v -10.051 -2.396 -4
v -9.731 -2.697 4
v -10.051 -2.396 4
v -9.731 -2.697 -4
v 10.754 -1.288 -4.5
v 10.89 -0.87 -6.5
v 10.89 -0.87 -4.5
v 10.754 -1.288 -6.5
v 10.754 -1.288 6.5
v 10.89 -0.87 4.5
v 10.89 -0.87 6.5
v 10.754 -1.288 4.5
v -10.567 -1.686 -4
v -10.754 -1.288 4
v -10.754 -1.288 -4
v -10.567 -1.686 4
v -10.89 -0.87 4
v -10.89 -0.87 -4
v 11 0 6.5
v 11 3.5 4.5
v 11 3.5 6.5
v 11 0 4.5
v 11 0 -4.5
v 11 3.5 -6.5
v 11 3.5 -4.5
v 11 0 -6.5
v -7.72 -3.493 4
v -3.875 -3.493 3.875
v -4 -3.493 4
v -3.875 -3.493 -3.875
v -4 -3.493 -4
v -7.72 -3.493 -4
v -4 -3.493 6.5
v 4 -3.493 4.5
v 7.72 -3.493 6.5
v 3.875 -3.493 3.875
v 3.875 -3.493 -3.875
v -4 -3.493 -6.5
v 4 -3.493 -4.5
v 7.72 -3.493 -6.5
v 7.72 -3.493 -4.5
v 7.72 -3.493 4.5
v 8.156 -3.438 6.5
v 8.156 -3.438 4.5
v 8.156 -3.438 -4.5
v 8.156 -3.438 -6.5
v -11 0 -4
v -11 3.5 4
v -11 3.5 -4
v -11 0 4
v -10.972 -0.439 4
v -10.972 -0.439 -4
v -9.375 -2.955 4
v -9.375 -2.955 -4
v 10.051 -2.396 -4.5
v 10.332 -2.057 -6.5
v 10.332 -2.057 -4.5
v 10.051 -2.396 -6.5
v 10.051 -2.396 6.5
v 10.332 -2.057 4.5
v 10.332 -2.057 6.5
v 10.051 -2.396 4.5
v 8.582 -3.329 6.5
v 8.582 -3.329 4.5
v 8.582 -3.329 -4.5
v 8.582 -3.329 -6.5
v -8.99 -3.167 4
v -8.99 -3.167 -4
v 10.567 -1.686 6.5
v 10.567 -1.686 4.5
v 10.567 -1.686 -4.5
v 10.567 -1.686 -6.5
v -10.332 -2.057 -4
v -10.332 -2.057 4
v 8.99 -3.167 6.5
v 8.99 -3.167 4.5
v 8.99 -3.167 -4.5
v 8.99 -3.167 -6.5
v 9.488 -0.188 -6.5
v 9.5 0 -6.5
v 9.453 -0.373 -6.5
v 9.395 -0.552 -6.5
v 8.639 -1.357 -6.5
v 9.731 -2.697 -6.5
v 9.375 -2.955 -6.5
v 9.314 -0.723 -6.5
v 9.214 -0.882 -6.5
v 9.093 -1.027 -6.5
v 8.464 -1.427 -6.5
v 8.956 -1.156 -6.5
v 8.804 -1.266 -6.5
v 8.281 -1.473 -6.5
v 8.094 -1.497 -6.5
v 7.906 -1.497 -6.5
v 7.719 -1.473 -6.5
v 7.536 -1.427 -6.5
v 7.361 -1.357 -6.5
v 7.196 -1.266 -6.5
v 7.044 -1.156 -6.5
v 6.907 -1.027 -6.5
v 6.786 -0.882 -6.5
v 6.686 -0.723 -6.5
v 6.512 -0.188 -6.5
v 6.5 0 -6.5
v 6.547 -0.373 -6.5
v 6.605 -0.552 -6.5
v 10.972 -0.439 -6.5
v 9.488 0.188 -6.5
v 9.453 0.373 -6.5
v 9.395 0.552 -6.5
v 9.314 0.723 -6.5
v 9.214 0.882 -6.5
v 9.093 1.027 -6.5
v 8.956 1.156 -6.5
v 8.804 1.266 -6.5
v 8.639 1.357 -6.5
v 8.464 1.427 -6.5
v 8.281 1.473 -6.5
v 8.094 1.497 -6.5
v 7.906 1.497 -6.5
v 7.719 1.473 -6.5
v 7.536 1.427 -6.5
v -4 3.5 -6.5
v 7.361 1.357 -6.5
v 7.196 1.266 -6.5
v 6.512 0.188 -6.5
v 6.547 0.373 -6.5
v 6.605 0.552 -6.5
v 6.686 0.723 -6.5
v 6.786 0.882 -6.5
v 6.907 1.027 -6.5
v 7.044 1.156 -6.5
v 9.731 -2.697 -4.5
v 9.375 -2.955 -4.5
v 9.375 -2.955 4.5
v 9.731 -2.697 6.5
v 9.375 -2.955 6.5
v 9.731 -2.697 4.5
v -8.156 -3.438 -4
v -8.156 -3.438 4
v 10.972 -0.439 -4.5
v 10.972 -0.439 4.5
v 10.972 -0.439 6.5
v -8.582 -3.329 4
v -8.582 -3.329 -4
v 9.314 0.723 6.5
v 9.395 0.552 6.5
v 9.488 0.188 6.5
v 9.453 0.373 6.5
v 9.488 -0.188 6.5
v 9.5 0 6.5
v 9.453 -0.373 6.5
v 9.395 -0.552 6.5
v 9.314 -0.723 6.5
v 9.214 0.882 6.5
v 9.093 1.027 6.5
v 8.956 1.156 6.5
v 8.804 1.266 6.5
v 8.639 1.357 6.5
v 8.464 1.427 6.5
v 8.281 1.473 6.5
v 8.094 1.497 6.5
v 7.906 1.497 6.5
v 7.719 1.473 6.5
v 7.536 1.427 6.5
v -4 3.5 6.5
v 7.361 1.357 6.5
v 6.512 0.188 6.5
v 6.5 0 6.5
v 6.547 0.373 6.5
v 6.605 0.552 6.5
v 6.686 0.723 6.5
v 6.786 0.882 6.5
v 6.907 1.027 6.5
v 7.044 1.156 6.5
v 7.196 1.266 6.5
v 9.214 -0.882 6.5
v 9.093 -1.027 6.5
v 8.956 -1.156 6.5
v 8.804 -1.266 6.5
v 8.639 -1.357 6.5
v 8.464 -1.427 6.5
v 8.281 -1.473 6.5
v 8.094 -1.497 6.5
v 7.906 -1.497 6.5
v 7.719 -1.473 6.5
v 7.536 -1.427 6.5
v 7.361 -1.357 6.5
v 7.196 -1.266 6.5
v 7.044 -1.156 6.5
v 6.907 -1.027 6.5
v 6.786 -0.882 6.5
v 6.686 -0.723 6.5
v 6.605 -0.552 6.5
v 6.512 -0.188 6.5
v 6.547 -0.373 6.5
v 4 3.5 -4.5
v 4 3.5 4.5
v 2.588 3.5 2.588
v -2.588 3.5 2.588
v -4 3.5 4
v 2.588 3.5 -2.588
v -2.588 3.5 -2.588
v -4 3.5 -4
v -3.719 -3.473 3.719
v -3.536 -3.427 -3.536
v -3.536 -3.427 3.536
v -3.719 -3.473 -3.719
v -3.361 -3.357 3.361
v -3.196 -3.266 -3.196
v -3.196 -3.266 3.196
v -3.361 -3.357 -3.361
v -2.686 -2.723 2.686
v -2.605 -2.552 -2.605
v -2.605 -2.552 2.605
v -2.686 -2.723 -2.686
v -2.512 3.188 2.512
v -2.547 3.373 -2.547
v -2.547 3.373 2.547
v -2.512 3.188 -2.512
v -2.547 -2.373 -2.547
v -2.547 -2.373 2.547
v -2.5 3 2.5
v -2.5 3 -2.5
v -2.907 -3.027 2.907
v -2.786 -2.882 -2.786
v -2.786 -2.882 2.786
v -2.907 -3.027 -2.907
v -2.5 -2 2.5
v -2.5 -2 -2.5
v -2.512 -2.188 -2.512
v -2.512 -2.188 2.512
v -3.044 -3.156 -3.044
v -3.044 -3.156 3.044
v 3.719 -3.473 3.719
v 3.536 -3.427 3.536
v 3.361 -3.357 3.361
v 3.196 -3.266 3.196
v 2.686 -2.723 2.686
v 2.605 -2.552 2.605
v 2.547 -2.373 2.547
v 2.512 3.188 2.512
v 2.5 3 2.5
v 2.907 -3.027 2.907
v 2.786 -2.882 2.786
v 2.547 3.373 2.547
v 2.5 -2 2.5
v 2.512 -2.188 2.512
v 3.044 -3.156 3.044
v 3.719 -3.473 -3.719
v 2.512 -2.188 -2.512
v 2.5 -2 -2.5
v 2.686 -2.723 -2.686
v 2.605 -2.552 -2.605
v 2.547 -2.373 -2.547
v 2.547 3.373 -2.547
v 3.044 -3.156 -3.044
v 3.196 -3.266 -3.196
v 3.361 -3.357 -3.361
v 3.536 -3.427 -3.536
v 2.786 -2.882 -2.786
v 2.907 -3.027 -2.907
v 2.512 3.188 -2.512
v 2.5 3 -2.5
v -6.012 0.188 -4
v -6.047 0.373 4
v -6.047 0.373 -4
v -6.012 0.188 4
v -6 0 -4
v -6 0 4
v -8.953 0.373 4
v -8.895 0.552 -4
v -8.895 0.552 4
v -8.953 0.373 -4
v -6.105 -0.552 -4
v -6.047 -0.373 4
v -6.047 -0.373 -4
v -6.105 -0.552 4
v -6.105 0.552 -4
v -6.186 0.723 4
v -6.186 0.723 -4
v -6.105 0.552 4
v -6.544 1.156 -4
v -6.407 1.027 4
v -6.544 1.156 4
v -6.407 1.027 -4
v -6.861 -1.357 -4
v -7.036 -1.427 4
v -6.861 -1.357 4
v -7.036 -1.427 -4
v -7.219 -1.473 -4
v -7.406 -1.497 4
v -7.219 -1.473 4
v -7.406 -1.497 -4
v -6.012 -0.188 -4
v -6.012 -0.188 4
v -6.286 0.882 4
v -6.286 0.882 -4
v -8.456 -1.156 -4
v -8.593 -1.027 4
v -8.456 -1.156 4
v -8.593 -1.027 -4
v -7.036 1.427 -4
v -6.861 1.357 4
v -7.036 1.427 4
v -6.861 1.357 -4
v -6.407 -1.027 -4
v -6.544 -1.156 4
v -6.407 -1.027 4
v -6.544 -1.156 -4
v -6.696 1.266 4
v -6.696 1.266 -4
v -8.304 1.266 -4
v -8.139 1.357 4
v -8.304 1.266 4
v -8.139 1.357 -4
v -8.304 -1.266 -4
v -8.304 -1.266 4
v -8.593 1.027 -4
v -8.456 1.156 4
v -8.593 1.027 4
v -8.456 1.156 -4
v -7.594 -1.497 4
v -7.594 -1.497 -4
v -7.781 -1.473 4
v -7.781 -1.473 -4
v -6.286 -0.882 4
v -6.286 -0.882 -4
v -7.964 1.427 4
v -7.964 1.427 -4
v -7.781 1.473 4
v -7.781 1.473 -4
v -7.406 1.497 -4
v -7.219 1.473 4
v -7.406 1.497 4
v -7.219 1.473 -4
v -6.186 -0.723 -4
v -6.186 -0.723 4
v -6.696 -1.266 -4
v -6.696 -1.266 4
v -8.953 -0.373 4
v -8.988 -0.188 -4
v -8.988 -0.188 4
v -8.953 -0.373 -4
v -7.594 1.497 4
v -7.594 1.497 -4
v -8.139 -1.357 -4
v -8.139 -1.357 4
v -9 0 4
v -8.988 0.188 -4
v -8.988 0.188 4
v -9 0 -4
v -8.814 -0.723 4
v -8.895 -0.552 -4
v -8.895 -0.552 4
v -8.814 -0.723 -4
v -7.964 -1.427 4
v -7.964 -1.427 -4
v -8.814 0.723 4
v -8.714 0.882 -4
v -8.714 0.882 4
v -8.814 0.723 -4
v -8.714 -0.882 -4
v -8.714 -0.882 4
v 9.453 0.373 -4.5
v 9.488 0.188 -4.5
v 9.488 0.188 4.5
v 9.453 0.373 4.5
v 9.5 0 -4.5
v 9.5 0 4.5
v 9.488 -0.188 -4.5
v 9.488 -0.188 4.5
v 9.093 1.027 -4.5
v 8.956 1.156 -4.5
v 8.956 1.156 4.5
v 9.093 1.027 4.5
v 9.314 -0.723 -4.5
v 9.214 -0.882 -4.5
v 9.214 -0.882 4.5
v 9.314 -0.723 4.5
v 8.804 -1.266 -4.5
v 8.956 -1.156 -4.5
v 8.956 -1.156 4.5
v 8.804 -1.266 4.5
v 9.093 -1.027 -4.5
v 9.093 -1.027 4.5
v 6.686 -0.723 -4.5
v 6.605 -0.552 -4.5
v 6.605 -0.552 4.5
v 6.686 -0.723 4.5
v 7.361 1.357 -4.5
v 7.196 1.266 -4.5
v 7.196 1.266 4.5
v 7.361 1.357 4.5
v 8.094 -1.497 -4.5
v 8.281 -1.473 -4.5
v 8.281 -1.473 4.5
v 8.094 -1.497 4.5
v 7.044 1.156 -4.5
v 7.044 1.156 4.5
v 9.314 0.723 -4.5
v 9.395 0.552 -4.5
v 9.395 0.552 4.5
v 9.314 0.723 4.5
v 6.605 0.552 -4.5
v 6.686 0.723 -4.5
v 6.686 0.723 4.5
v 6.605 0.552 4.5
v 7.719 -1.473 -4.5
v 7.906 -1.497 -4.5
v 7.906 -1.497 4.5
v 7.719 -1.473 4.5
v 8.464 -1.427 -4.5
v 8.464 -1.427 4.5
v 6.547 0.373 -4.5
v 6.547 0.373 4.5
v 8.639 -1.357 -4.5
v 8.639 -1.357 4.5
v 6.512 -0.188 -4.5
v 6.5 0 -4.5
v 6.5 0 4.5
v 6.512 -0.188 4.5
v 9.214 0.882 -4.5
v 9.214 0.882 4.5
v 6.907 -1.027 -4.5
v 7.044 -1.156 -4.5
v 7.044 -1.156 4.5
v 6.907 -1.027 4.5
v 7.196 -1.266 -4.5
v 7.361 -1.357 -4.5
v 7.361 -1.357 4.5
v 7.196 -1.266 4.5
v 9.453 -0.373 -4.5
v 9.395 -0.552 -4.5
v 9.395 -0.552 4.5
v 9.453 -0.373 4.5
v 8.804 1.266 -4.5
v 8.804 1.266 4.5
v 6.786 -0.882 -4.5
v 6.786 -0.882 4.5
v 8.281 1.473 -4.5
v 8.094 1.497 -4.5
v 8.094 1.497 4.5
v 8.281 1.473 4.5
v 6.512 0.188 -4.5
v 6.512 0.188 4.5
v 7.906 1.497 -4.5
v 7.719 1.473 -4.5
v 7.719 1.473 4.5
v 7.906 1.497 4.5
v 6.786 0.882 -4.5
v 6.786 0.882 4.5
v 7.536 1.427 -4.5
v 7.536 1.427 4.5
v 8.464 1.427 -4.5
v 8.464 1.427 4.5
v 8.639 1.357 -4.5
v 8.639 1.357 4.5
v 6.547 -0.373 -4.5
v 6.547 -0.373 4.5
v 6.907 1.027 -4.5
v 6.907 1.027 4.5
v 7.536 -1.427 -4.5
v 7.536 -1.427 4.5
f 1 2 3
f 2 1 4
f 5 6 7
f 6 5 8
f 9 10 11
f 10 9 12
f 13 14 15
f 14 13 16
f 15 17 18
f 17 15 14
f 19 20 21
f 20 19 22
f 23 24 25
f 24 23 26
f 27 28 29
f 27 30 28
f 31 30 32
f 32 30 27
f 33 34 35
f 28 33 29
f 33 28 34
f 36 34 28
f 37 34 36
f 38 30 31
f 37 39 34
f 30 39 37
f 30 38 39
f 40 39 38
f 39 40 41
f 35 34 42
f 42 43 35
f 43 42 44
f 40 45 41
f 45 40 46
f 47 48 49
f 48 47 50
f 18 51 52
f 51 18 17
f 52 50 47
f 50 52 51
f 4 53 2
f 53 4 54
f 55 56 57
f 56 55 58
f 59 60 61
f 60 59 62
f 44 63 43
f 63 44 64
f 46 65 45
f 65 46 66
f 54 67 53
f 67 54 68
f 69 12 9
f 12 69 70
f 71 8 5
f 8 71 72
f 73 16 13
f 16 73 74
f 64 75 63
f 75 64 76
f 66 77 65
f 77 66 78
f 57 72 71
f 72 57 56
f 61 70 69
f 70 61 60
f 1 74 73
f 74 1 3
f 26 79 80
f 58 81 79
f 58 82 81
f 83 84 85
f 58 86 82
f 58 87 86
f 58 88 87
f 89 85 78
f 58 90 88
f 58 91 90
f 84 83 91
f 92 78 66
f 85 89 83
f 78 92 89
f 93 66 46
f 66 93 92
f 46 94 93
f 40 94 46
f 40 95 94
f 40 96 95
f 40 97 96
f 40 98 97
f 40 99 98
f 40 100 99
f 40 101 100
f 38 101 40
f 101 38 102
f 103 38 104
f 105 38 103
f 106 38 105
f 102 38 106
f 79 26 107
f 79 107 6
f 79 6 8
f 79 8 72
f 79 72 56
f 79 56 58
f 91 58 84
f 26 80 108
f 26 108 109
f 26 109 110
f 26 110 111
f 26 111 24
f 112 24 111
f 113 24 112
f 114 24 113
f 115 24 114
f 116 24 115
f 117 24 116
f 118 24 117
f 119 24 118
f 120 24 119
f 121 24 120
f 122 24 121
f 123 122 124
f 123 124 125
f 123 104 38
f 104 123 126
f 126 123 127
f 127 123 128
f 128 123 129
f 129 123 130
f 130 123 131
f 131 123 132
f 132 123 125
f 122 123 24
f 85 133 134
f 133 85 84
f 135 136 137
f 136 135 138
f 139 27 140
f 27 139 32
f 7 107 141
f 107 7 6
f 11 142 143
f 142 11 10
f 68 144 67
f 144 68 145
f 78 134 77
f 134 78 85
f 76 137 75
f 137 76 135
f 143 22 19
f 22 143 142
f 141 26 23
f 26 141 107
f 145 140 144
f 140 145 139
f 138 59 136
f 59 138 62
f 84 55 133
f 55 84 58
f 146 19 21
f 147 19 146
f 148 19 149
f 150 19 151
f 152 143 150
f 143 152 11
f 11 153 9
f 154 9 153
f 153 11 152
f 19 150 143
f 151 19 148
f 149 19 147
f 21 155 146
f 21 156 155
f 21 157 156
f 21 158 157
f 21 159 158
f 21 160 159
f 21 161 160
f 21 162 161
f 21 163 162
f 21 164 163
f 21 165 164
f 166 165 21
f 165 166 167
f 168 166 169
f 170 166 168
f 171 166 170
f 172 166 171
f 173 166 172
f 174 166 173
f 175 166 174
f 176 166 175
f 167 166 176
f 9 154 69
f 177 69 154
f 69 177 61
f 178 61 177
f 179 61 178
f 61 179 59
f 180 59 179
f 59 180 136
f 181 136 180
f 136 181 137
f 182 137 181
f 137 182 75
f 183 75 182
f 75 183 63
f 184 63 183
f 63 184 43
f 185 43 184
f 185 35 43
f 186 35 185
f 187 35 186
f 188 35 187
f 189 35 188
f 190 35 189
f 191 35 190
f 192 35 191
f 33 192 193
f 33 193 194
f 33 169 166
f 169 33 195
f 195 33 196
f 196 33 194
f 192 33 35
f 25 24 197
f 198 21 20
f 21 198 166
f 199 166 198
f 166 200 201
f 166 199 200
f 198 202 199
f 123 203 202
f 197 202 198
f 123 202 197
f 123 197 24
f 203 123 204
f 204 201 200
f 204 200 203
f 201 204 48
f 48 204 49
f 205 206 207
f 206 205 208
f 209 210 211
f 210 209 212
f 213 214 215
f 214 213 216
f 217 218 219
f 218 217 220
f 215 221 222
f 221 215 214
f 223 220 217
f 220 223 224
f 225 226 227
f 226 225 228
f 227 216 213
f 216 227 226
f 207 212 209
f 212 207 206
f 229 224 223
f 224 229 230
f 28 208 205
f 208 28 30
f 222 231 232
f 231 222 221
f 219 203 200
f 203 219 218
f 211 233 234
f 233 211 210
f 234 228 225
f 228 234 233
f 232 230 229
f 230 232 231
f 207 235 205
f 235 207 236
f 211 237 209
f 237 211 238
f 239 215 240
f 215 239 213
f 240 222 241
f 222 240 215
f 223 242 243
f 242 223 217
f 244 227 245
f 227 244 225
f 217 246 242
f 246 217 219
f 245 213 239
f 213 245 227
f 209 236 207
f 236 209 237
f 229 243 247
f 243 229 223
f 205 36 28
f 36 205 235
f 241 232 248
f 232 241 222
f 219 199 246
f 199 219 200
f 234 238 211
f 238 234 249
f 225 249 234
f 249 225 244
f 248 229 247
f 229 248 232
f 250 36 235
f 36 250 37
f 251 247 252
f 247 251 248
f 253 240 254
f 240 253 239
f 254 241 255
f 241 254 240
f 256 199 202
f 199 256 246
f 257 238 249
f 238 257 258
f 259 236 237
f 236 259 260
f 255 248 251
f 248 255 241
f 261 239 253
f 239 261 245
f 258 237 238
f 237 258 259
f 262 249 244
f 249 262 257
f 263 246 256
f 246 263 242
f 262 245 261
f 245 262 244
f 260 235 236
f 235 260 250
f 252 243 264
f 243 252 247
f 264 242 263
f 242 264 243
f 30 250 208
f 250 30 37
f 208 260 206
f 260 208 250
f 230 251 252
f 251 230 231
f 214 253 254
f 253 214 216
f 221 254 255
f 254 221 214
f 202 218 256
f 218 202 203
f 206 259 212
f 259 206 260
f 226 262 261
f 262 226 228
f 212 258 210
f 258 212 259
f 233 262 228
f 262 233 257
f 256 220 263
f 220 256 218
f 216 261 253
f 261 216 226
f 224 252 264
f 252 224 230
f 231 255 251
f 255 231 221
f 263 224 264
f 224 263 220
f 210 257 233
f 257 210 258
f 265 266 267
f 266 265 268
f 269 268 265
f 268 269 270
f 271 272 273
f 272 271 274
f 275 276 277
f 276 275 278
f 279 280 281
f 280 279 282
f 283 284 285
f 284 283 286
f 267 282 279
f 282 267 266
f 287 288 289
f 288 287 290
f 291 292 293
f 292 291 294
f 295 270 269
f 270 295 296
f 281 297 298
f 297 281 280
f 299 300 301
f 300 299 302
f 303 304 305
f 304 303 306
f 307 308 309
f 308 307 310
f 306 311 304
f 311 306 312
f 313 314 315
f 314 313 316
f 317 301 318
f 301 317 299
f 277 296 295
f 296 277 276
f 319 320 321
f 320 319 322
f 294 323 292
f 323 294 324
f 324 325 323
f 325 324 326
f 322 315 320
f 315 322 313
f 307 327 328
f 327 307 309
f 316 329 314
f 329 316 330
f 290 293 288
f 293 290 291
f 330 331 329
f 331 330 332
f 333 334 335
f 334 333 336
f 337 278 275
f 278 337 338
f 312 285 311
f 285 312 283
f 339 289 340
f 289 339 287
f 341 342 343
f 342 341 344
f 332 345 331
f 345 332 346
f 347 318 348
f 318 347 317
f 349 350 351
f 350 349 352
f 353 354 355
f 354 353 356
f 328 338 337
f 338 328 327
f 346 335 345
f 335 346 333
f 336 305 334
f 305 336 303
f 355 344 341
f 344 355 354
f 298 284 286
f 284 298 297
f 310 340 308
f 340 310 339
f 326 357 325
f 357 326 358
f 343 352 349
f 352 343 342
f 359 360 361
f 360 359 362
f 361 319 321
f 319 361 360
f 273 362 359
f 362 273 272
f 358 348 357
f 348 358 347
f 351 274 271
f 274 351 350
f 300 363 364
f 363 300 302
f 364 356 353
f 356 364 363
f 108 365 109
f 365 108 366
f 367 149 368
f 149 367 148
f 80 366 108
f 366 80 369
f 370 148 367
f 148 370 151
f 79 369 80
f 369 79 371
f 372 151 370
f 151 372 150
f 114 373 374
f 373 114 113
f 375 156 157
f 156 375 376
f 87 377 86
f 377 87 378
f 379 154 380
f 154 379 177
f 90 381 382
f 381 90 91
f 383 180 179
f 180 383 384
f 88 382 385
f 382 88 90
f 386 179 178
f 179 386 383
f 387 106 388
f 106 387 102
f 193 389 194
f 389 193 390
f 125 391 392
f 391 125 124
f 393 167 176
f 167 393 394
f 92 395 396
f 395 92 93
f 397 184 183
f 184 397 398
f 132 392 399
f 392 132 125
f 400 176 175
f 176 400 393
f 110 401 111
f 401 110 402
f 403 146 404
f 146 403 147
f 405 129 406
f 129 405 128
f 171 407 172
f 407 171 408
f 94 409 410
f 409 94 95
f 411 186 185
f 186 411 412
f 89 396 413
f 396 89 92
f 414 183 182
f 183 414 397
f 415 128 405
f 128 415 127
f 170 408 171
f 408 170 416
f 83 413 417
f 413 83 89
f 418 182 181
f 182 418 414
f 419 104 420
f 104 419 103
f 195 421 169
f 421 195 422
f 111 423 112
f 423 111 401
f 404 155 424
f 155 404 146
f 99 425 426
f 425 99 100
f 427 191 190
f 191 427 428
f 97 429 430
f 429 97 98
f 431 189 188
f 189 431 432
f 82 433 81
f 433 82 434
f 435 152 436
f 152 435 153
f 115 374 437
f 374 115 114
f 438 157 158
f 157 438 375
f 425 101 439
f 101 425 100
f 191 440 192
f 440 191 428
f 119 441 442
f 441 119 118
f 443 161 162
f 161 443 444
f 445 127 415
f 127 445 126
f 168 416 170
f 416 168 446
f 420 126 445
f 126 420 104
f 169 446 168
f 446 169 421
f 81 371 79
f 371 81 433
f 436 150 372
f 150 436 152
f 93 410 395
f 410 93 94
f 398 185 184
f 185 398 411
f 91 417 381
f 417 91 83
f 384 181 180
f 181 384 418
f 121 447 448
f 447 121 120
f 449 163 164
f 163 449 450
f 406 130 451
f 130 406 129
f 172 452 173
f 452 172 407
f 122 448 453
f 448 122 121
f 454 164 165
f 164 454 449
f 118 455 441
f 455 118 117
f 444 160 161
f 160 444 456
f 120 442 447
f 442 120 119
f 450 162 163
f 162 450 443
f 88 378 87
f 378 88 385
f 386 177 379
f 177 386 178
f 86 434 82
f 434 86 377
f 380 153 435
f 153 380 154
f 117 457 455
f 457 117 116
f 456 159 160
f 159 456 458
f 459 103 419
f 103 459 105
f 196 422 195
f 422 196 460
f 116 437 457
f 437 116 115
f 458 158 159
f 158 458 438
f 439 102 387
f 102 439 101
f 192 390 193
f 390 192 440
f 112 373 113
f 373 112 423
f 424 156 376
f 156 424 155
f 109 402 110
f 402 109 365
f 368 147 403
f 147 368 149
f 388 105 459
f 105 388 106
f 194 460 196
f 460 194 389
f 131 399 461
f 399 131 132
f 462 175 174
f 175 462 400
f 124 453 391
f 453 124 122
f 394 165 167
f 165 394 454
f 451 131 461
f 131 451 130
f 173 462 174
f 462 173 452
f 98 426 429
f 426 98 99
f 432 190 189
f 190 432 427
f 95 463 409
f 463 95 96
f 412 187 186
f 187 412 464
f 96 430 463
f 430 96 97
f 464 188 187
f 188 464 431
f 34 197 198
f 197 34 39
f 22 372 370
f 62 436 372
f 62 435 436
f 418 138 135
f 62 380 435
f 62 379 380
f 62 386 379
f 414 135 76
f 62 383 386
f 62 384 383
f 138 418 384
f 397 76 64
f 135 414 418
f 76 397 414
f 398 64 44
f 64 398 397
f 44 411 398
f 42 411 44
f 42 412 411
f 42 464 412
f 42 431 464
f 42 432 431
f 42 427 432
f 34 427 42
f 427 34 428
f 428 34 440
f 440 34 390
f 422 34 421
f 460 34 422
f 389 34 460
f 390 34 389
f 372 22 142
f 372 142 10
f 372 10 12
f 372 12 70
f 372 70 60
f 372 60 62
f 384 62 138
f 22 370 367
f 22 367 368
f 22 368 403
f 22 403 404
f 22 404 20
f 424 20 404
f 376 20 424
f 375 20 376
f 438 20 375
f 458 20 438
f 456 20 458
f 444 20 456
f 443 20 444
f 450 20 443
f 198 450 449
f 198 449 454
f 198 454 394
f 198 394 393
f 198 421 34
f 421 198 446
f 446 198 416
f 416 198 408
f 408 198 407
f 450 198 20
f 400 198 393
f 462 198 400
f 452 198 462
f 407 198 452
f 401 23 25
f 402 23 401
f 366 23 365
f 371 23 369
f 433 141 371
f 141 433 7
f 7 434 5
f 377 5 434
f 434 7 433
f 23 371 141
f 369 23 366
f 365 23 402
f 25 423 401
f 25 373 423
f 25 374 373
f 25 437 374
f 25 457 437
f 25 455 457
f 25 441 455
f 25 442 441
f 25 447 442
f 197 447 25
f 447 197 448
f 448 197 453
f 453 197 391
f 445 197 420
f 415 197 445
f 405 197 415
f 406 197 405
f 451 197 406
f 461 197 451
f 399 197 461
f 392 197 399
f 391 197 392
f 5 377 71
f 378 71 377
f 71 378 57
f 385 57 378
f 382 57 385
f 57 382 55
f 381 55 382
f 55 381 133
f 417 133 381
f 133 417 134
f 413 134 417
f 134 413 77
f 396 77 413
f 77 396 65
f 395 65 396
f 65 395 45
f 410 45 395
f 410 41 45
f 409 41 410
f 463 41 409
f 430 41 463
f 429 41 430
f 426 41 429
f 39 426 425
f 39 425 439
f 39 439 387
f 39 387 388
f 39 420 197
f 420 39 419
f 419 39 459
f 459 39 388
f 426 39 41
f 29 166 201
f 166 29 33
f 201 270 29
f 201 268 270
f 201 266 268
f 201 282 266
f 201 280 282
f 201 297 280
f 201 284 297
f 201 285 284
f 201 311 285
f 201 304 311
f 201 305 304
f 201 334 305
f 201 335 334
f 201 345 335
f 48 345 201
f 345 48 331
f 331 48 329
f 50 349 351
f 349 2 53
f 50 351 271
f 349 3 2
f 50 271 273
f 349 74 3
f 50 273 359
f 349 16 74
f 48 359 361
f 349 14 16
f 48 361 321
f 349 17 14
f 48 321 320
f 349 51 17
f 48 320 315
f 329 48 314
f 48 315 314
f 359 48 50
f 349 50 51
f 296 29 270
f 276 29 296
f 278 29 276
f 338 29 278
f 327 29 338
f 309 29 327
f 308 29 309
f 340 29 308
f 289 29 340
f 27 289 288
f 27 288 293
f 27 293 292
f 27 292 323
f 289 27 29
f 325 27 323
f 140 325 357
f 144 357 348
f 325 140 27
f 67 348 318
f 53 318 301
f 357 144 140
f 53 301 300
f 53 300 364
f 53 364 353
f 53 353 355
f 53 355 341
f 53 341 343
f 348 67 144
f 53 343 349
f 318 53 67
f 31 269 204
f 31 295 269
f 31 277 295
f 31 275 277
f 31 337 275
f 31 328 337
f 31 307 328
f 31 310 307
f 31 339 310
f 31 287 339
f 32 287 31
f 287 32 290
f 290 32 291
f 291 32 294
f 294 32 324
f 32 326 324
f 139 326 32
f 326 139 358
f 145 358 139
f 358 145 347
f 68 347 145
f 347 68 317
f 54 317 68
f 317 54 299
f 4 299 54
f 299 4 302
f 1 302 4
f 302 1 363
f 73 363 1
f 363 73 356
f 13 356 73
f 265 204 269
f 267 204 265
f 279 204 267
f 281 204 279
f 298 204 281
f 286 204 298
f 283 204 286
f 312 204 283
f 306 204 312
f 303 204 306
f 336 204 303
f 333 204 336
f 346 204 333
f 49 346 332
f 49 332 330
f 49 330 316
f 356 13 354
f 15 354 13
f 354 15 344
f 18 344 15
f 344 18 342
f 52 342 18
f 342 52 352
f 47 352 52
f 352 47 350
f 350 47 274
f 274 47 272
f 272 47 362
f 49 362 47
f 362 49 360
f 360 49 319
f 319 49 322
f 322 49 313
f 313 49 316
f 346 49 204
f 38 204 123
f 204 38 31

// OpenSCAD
HOLE_DIA = 3;
HOLE_SIZE = 5;
THICKNESS = 1.5;

CHAIN_DELTA = 1;
CHAIN_SPACING = 8;

FRONT_WIDTH = 8;
FRONT_DIA = HOLE_DIA + 2 * THICKNESS;
BACK_WIDTH = 2;
BACK_DIA = FRONT_DIA + CHAIN_DELTA;

$fn = 50;

module chain_link_base() {
  union() {
    hull() {
      translate([-(FRONT_DIA + CHAIN_SPACING)/2, 0, 0])
      cylinder(d = FRONT_DIA, h = FRONT_WIDTH, center = true);

      translate([(BACK_DIA + CHAIN_SPACING)/2, 0, 0])
      cylinder(d = FRONT_DIA, h = FRONT_WIDTH, center = true);
    }
    hull() {
      translate([(BACK_DIA + CHAIN_SPACING)/2, 0, 0])
      cylinder(d = BACK_DIA, h = FRONT_WIDTH + 2 * BACK_WIDTH + CHAIN_DELTA, center = true);

      translate([-(BACK_DIA + CHAIN_SPACING)/2, 0, 0])
      cylinder(d = BACK_DIA, h = FRONT_WIDTH + 2 * BACK_WIDTH + CHAIN_DELTA, center = true);
    }
  }
}

module holes() {
  #union() {
    translate([-(FRONT_DIA + CHAIN_SPACING + CHAIN_DELTA)/2, 0, 0])
    cylinder(d = HOLE_DIA, h = FRONT_WIDTH + 2 * BACK_WIDTH + 2 * CHAIN_DELTA, center = true);

    translate([(BACK_DIA + CHAIN_SPACING + CHAIN_DELTA)/2, 0, 0])
    cylinder(d = HOLE_DIA, h = FRONT_WIDTH + 2 * BACK_WIDTH + 2 * CHAIN_DELTA, center = true);

    difference() {
      cube(size = [HOLE_SIZE + HOLE_DIA, BACK_DIA, HOLE_SIZE + HOLE_DIA], center = true);

      for(i = [0:3]) {
        rotate([0, i * 360/4, 0])
        translate([-(HOLE_SIZE + HOLE_DIA)/2, -(BACK_DIA - HOLE_DIA)/2, 0])
        hull() {
          cylinder(d = HOLE_DIA, h = HOLE_SIZE + HOLE_DIA, center = true);
          translate([0, HOLE_SIZE, 0])
          cylinder(d = HOLE_DIA, h = HOLE_SIZE + HOLE_DIA, center = true);
        }
      }
    }
  }
}

module chain_link() {
  difference() {
    intersection() {
      hull() {
        chain_link_base();
        translate([0, BACK_DIA, 0])
        chain_link_base();
      }
      cube(size = [FRONT_DIA + BACK_DIA + 2 * CHAIN_SPACING, BACK_DIA, FRONT_WIDTH + 2 * BACK_WIDTH + CHAIN_DELTA], center = true);
    }

    #translate([(BACK_DIA + CHAIN_SPACING)/2, 0, 0])
    hull() {
      translate([0, BACK_DIA, 0])
      cylinder(d = BACK_DIA, h = FRONT_WIDTH + CHAIN_DELTA, center = true);
      translate([0, -BACK_DIA, 0])
      cylinder(d = BACK_DIA, h = FRONT_WIDTH + CHAIN_DELTA, center = true);
      translate([BACK_DIA, 0, 0])
      cylinder(d = BACK_DIA, h = FRONT_WIDTH + CHAIN_DELTA, center = true);
    }

    #translate([-(FRONT_DIA + CHAIN_SPACING + CHAIN_DELTA)/2, 0, (FRONT_WIDTH + BACK_WIDTH + CHAIN_DELTA)/2])
    hull() {
      translate([0, BACK_DIA, 0])
      cylinder(d = BACK_DIA, h = BACK_WIDTH + CHAIN_DELTA, center = true);
      translate([0, -BACK_DIA, 0])
      cylinder(d = BACK_DIA, h = BACK_WIDTH + CHAIN_DELTA, center = true);
      translate([-BACK_DIA, 0, 0])
      cylinder(d = BACK_DIA, h = BACK_WIDTH + CHAIN_DELTA, center = true);
    }

    #translate([-(FRONT_DIA + CHAIN_SPACING + CHAIN_DELTA)/2, 0, -(FRONT_WIDTH + BACK_WIDTH + CHAIN_DELTA)/2])
    hull() {
      translate([0, BACK_DIA, 0])
      cylinder(d = BACK_DIA, h = BACK_WIDTH + CHAIN_DELTA, center = true);
      translate([0, -BACK_DIA, 0])
      cylinder(d = BACK_DIA, h = BACK_WIDTH + CHAIN_DELTA, center = true);
      translate([-BACK_DIA, 0, 0])
      cylinder(d = BACK_DIA, h = BACK_WIDTH + CHAIN_DELTA, center = true);
    }

    holes();
  }
}

!chain_link();
translate([(BACK_DIA + CHAIN_SPACING + CHAIN_DELTA/2), 0, 0])
chain_link();
